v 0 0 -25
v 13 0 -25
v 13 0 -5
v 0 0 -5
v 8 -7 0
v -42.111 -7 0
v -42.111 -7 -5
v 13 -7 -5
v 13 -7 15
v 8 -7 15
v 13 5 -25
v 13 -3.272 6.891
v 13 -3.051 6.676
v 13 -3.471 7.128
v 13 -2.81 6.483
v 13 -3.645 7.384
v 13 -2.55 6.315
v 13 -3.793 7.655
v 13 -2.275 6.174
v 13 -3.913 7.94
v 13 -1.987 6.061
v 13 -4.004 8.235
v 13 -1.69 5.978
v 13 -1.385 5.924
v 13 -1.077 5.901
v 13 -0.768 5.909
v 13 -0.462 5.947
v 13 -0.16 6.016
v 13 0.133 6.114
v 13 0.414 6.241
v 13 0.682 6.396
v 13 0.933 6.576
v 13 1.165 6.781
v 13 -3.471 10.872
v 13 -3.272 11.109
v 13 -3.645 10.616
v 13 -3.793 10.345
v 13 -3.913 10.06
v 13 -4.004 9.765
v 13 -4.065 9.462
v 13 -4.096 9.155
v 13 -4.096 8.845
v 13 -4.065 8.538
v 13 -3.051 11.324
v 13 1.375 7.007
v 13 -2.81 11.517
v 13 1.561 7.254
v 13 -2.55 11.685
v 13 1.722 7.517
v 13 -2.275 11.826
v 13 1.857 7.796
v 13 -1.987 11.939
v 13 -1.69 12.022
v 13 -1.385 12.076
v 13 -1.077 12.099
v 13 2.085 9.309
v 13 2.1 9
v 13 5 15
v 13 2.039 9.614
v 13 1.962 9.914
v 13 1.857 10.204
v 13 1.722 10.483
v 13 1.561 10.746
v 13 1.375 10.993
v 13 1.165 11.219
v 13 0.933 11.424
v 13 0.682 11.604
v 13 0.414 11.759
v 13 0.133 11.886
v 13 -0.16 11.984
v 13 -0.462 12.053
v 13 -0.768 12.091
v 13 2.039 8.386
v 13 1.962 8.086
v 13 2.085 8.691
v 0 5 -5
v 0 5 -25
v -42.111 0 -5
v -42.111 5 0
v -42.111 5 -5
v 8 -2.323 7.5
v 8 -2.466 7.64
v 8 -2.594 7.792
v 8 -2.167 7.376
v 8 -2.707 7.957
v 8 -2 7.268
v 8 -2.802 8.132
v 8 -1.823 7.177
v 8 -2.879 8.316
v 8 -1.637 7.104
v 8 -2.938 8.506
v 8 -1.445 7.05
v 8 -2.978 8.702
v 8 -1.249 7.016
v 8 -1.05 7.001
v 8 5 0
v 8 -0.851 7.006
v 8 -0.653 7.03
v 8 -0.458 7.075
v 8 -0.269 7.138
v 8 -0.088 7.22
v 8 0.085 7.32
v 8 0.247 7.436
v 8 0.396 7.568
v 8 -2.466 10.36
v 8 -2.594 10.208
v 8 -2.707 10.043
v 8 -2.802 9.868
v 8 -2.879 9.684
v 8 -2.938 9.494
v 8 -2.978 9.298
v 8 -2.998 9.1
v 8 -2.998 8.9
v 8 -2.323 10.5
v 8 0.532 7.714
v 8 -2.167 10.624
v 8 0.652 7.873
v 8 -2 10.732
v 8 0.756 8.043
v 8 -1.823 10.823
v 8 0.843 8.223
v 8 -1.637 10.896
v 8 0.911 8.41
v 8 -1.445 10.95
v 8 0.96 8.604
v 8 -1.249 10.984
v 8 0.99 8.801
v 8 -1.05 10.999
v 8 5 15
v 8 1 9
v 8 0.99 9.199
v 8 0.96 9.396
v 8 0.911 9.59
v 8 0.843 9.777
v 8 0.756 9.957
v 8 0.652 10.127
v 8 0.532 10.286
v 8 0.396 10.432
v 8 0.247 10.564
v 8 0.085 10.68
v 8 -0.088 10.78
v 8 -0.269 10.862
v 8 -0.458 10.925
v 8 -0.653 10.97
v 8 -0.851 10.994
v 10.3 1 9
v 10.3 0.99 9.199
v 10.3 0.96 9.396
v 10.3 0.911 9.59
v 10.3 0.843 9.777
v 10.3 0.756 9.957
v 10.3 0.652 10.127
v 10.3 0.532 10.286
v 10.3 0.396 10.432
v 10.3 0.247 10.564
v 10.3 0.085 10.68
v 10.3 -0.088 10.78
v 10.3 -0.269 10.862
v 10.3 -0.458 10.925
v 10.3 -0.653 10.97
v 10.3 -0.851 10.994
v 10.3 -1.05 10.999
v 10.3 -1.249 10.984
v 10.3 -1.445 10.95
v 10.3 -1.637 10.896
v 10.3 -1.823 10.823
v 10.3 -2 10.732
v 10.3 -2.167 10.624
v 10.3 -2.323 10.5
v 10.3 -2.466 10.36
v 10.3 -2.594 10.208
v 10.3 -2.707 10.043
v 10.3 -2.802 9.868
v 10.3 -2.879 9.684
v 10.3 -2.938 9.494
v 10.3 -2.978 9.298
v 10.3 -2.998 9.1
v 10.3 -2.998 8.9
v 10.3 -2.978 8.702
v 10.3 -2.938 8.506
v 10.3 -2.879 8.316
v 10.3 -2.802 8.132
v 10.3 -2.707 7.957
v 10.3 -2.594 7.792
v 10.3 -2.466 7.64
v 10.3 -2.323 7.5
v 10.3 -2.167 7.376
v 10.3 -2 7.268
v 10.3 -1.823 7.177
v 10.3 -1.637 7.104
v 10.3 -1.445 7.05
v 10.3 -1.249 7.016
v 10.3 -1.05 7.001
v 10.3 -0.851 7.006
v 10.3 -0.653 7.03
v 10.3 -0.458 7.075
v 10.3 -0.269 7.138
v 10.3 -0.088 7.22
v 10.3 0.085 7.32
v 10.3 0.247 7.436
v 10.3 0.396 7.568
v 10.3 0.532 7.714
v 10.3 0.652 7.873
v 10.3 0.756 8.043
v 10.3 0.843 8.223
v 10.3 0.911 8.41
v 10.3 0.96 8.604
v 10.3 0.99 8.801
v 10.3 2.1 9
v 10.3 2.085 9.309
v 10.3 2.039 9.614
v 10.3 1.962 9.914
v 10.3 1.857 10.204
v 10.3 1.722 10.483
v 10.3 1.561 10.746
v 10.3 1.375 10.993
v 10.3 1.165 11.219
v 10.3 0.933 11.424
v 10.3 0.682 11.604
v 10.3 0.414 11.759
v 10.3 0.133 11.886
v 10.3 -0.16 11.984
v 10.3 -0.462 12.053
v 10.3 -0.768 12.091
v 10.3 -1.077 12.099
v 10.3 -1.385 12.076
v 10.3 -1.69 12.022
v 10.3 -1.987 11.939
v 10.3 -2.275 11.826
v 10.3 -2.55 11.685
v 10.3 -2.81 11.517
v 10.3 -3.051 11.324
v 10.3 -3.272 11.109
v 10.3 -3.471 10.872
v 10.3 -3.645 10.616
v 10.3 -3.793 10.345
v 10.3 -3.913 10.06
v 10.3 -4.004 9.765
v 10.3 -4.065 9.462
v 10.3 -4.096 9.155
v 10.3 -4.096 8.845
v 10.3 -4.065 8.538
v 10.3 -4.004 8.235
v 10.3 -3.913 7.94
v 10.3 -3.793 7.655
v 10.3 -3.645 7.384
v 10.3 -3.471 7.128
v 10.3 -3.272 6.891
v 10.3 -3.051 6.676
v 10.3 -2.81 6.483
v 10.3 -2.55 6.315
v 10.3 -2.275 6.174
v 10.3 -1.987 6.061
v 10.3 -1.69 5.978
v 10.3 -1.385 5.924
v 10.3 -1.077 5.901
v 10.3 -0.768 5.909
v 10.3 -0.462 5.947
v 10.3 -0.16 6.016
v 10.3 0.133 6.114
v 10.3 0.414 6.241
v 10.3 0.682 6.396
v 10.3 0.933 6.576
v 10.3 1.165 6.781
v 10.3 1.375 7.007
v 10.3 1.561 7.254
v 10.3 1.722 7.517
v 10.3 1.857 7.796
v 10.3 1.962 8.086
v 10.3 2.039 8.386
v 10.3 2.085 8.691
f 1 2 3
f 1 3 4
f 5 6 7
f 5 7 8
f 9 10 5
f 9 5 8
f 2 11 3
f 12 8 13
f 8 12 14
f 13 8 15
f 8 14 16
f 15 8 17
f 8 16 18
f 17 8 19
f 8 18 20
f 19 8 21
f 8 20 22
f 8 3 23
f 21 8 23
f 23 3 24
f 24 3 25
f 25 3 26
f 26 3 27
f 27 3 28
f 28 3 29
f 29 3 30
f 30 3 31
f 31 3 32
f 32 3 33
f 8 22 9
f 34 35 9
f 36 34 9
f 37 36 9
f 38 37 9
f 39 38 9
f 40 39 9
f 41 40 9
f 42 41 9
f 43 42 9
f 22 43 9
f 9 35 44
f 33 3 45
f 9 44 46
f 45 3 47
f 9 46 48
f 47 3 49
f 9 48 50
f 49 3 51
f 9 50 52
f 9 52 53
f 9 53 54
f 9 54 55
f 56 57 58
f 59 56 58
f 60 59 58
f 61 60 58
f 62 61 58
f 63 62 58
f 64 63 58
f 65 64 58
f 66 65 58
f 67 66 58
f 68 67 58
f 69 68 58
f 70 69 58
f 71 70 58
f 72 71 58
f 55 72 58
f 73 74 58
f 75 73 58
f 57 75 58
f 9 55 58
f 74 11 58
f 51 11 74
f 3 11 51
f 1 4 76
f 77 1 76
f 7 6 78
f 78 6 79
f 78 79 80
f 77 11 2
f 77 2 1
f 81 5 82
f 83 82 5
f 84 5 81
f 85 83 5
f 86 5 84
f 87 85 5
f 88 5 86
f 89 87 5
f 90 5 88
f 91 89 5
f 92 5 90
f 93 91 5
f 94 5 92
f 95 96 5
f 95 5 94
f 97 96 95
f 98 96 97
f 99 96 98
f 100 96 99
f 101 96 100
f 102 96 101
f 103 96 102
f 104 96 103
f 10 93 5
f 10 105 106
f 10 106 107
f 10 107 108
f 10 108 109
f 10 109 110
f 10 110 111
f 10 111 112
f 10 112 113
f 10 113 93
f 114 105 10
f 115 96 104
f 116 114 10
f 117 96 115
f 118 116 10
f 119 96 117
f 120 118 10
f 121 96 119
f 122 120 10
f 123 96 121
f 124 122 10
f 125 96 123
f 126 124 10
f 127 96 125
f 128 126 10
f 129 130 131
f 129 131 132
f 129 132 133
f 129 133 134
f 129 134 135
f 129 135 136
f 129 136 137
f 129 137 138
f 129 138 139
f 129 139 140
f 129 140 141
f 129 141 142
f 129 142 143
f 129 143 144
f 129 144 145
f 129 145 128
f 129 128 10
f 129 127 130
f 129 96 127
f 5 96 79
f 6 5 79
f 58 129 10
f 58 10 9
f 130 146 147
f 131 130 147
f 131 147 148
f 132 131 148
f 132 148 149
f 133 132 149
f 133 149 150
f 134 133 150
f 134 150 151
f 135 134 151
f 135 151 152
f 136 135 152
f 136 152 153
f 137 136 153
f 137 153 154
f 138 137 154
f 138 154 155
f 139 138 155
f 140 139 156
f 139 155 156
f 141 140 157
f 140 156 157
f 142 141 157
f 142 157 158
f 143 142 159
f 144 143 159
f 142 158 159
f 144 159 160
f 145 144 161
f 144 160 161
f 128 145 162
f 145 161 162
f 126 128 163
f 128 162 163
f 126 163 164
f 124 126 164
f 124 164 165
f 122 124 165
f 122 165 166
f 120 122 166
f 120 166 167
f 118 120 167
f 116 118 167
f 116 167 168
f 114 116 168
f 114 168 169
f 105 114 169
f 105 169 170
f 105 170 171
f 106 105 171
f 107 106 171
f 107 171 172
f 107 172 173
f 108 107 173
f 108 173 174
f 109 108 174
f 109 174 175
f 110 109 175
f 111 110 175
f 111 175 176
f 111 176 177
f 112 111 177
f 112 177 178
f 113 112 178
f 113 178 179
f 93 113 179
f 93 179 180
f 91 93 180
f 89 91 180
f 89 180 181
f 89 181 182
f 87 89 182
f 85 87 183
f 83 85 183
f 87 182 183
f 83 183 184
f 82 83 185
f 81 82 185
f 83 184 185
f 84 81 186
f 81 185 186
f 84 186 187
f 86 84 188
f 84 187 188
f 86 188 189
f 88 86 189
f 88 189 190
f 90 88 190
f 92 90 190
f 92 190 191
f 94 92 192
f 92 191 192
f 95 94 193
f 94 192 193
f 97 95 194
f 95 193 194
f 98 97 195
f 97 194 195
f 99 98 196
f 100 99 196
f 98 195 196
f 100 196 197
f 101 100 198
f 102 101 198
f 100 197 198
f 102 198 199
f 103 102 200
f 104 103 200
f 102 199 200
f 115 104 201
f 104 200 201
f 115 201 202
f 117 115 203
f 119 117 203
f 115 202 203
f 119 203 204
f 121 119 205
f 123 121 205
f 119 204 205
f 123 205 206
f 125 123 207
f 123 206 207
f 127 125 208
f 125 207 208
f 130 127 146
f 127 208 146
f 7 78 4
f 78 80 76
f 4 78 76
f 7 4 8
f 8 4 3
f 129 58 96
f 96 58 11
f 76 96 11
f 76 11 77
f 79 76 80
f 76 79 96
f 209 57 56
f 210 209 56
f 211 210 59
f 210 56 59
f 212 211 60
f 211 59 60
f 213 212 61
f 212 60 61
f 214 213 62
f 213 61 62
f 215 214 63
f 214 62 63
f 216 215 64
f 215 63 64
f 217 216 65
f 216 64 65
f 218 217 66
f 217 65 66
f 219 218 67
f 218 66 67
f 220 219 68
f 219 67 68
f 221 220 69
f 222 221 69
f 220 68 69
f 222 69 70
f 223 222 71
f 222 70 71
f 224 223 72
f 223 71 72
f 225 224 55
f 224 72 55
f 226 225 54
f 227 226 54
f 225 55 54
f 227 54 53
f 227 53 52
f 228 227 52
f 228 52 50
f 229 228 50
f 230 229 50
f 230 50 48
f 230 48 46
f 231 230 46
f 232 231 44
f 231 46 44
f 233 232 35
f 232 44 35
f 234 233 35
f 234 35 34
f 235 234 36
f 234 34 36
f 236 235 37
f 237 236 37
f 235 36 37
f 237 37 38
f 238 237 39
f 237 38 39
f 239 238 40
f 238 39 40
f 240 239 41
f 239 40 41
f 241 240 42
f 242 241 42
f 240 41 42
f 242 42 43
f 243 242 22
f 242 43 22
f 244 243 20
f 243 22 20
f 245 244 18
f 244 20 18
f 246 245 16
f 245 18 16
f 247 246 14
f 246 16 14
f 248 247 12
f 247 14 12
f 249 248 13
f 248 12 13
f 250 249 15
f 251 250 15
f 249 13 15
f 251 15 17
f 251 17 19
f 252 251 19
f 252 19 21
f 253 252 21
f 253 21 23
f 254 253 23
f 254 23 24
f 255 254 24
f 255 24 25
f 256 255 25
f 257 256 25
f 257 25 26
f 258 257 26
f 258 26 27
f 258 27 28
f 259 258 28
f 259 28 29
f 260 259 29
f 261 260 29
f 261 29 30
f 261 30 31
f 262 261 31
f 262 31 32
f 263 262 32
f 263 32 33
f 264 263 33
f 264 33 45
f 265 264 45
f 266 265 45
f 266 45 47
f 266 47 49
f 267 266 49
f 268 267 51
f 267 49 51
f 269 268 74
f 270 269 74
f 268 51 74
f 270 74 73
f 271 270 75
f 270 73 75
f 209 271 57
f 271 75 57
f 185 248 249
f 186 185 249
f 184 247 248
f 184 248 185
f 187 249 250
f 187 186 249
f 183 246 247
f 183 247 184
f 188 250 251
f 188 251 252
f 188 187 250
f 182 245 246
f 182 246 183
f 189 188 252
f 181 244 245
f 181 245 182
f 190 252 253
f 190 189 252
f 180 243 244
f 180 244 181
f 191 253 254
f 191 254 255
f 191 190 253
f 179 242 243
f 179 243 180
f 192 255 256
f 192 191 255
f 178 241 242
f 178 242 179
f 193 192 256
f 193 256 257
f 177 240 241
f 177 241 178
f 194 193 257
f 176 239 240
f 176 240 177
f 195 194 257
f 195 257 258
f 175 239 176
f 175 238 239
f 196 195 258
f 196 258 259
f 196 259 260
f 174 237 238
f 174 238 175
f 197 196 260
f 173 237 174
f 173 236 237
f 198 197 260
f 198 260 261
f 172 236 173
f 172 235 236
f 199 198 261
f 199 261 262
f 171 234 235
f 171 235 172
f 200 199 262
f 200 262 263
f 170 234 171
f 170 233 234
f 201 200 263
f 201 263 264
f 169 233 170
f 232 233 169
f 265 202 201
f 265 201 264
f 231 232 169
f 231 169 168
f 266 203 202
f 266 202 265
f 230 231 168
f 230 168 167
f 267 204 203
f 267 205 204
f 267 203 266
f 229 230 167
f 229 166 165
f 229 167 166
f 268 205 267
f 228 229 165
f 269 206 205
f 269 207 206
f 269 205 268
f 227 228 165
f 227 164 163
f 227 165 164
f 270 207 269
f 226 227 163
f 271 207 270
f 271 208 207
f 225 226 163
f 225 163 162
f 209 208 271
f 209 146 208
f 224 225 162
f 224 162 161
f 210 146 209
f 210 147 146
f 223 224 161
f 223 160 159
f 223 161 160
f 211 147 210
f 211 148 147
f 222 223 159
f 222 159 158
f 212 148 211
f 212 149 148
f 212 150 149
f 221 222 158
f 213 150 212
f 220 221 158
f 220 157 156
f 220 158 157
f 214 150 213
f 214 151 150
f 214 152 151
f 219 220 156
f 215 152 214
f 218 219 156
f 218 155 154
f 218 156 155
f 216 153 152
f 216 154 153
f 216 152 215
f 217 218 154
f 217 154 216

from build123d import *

# Parameters (mm, degrees)
SKETCH_1_W          = 42.110617321
SKETCH_1_H          = 5
EXTRUDE_1_DEPTH     = 5
SKETCH_2_W          = 13
SKETCH_2_H          = 5
EXTRUDE_2_DEPTH     = 25
SKETCH_2_3_W        = 5
SKETCH_2_3_H        = 5
EXTRUDE_3_DEPTH     = 15
SKETCH_3_W          = 5
SKETCH_3_H          = 15
EXTRUDE_4_DEPTH     = 7
SKETCH_4_R          = 2
CUT_EXTRUDE_1_DEPTH = 61.919456182
SKETCH_4_3_R        = 3.1
CUT_EXTRUDE_2_DEPTH = 2.7


with BuildPart() as part:
    # 草图1 → 凸台-拉伸1 (new body)
    with BuildSketch(Plane(origin=(0, 0, 0), x_dir=(1, 0, 0), z_dir=(0, 1, 0))):
        with Locations((-21.05530866, 2.5)):
            Rectangle(SKETCH_1_W, SKETCH_1_H)
    extrude(amount=EXTRUDE_1_DEPTH)

    # 草图2 → 凸台-拉伸2 (add)
    with BuildSketch(Plane(origin=(0, 0, 0), x_dir=(-1, 0, 0), z_dir=(0, 0, -1))):
        with Locations((-6.5, 2.5)):
            Rectangle(SKETCH_2_W, SKETCH_2_H)
    extrude(amount=EXTRUDE_2_DEPTH)

    # 草图2<3> → 凸台-拉伸3 (add)
    with BuildSketch(Plane(origin=(0, 0, 0), x_dir=(-1, 0, 0), z_dir=(0, 0, -1))):
        with Locations((-10.5, 2.5)):
            Rectangle(SKETCH_2_3_W, SKETCH_2_3_H)
    extrude(amount=-EXTRUDE_3_DEPTH)

    # 草图3 → 凸台-拉伸4 (add)
    with BuildSketch(Plane.XZ):
        Polygon((8, 0), (-42.110617321, 0), (-42.110617321, -5), (13, -5), (13, 0), align=None)
        with Locations((10.5, 7.5)):
            Rectangle(SKETCH_3_W, SKETCH_3_H)
    extrude(amount=EXTRUDE_4_DEPTH)

    # 草图4 → 切除-拉伸1 (cut, through all)
    with BuildSketch(Plane(origin=(13, 0, 0), x_dir=(0, 0, -1), z_dir=(1, 0, 0))):
        with Locations((-9, -1)):
            Circle(SKETCH_4_R)
    extrude(amount=-CUT_EXTRUDE_1_DEPTH, mode=Mode.SUBTRACT)

    # 草图4<3> → 切除-拉伸2 (cut)
    with BuildSketch(Plane(origin=(13, 0, 0), x_dir=(0, 0, -1), z_dir=(1, 0, 0))):
        with Locations((-9, -1)):
            Circle(SKETCH_4_3_R)
    extrude(amount=-CUT_EXTRUDE_2_DEPTH, mode=Mode.SUBTRACT)


solid = part.part
